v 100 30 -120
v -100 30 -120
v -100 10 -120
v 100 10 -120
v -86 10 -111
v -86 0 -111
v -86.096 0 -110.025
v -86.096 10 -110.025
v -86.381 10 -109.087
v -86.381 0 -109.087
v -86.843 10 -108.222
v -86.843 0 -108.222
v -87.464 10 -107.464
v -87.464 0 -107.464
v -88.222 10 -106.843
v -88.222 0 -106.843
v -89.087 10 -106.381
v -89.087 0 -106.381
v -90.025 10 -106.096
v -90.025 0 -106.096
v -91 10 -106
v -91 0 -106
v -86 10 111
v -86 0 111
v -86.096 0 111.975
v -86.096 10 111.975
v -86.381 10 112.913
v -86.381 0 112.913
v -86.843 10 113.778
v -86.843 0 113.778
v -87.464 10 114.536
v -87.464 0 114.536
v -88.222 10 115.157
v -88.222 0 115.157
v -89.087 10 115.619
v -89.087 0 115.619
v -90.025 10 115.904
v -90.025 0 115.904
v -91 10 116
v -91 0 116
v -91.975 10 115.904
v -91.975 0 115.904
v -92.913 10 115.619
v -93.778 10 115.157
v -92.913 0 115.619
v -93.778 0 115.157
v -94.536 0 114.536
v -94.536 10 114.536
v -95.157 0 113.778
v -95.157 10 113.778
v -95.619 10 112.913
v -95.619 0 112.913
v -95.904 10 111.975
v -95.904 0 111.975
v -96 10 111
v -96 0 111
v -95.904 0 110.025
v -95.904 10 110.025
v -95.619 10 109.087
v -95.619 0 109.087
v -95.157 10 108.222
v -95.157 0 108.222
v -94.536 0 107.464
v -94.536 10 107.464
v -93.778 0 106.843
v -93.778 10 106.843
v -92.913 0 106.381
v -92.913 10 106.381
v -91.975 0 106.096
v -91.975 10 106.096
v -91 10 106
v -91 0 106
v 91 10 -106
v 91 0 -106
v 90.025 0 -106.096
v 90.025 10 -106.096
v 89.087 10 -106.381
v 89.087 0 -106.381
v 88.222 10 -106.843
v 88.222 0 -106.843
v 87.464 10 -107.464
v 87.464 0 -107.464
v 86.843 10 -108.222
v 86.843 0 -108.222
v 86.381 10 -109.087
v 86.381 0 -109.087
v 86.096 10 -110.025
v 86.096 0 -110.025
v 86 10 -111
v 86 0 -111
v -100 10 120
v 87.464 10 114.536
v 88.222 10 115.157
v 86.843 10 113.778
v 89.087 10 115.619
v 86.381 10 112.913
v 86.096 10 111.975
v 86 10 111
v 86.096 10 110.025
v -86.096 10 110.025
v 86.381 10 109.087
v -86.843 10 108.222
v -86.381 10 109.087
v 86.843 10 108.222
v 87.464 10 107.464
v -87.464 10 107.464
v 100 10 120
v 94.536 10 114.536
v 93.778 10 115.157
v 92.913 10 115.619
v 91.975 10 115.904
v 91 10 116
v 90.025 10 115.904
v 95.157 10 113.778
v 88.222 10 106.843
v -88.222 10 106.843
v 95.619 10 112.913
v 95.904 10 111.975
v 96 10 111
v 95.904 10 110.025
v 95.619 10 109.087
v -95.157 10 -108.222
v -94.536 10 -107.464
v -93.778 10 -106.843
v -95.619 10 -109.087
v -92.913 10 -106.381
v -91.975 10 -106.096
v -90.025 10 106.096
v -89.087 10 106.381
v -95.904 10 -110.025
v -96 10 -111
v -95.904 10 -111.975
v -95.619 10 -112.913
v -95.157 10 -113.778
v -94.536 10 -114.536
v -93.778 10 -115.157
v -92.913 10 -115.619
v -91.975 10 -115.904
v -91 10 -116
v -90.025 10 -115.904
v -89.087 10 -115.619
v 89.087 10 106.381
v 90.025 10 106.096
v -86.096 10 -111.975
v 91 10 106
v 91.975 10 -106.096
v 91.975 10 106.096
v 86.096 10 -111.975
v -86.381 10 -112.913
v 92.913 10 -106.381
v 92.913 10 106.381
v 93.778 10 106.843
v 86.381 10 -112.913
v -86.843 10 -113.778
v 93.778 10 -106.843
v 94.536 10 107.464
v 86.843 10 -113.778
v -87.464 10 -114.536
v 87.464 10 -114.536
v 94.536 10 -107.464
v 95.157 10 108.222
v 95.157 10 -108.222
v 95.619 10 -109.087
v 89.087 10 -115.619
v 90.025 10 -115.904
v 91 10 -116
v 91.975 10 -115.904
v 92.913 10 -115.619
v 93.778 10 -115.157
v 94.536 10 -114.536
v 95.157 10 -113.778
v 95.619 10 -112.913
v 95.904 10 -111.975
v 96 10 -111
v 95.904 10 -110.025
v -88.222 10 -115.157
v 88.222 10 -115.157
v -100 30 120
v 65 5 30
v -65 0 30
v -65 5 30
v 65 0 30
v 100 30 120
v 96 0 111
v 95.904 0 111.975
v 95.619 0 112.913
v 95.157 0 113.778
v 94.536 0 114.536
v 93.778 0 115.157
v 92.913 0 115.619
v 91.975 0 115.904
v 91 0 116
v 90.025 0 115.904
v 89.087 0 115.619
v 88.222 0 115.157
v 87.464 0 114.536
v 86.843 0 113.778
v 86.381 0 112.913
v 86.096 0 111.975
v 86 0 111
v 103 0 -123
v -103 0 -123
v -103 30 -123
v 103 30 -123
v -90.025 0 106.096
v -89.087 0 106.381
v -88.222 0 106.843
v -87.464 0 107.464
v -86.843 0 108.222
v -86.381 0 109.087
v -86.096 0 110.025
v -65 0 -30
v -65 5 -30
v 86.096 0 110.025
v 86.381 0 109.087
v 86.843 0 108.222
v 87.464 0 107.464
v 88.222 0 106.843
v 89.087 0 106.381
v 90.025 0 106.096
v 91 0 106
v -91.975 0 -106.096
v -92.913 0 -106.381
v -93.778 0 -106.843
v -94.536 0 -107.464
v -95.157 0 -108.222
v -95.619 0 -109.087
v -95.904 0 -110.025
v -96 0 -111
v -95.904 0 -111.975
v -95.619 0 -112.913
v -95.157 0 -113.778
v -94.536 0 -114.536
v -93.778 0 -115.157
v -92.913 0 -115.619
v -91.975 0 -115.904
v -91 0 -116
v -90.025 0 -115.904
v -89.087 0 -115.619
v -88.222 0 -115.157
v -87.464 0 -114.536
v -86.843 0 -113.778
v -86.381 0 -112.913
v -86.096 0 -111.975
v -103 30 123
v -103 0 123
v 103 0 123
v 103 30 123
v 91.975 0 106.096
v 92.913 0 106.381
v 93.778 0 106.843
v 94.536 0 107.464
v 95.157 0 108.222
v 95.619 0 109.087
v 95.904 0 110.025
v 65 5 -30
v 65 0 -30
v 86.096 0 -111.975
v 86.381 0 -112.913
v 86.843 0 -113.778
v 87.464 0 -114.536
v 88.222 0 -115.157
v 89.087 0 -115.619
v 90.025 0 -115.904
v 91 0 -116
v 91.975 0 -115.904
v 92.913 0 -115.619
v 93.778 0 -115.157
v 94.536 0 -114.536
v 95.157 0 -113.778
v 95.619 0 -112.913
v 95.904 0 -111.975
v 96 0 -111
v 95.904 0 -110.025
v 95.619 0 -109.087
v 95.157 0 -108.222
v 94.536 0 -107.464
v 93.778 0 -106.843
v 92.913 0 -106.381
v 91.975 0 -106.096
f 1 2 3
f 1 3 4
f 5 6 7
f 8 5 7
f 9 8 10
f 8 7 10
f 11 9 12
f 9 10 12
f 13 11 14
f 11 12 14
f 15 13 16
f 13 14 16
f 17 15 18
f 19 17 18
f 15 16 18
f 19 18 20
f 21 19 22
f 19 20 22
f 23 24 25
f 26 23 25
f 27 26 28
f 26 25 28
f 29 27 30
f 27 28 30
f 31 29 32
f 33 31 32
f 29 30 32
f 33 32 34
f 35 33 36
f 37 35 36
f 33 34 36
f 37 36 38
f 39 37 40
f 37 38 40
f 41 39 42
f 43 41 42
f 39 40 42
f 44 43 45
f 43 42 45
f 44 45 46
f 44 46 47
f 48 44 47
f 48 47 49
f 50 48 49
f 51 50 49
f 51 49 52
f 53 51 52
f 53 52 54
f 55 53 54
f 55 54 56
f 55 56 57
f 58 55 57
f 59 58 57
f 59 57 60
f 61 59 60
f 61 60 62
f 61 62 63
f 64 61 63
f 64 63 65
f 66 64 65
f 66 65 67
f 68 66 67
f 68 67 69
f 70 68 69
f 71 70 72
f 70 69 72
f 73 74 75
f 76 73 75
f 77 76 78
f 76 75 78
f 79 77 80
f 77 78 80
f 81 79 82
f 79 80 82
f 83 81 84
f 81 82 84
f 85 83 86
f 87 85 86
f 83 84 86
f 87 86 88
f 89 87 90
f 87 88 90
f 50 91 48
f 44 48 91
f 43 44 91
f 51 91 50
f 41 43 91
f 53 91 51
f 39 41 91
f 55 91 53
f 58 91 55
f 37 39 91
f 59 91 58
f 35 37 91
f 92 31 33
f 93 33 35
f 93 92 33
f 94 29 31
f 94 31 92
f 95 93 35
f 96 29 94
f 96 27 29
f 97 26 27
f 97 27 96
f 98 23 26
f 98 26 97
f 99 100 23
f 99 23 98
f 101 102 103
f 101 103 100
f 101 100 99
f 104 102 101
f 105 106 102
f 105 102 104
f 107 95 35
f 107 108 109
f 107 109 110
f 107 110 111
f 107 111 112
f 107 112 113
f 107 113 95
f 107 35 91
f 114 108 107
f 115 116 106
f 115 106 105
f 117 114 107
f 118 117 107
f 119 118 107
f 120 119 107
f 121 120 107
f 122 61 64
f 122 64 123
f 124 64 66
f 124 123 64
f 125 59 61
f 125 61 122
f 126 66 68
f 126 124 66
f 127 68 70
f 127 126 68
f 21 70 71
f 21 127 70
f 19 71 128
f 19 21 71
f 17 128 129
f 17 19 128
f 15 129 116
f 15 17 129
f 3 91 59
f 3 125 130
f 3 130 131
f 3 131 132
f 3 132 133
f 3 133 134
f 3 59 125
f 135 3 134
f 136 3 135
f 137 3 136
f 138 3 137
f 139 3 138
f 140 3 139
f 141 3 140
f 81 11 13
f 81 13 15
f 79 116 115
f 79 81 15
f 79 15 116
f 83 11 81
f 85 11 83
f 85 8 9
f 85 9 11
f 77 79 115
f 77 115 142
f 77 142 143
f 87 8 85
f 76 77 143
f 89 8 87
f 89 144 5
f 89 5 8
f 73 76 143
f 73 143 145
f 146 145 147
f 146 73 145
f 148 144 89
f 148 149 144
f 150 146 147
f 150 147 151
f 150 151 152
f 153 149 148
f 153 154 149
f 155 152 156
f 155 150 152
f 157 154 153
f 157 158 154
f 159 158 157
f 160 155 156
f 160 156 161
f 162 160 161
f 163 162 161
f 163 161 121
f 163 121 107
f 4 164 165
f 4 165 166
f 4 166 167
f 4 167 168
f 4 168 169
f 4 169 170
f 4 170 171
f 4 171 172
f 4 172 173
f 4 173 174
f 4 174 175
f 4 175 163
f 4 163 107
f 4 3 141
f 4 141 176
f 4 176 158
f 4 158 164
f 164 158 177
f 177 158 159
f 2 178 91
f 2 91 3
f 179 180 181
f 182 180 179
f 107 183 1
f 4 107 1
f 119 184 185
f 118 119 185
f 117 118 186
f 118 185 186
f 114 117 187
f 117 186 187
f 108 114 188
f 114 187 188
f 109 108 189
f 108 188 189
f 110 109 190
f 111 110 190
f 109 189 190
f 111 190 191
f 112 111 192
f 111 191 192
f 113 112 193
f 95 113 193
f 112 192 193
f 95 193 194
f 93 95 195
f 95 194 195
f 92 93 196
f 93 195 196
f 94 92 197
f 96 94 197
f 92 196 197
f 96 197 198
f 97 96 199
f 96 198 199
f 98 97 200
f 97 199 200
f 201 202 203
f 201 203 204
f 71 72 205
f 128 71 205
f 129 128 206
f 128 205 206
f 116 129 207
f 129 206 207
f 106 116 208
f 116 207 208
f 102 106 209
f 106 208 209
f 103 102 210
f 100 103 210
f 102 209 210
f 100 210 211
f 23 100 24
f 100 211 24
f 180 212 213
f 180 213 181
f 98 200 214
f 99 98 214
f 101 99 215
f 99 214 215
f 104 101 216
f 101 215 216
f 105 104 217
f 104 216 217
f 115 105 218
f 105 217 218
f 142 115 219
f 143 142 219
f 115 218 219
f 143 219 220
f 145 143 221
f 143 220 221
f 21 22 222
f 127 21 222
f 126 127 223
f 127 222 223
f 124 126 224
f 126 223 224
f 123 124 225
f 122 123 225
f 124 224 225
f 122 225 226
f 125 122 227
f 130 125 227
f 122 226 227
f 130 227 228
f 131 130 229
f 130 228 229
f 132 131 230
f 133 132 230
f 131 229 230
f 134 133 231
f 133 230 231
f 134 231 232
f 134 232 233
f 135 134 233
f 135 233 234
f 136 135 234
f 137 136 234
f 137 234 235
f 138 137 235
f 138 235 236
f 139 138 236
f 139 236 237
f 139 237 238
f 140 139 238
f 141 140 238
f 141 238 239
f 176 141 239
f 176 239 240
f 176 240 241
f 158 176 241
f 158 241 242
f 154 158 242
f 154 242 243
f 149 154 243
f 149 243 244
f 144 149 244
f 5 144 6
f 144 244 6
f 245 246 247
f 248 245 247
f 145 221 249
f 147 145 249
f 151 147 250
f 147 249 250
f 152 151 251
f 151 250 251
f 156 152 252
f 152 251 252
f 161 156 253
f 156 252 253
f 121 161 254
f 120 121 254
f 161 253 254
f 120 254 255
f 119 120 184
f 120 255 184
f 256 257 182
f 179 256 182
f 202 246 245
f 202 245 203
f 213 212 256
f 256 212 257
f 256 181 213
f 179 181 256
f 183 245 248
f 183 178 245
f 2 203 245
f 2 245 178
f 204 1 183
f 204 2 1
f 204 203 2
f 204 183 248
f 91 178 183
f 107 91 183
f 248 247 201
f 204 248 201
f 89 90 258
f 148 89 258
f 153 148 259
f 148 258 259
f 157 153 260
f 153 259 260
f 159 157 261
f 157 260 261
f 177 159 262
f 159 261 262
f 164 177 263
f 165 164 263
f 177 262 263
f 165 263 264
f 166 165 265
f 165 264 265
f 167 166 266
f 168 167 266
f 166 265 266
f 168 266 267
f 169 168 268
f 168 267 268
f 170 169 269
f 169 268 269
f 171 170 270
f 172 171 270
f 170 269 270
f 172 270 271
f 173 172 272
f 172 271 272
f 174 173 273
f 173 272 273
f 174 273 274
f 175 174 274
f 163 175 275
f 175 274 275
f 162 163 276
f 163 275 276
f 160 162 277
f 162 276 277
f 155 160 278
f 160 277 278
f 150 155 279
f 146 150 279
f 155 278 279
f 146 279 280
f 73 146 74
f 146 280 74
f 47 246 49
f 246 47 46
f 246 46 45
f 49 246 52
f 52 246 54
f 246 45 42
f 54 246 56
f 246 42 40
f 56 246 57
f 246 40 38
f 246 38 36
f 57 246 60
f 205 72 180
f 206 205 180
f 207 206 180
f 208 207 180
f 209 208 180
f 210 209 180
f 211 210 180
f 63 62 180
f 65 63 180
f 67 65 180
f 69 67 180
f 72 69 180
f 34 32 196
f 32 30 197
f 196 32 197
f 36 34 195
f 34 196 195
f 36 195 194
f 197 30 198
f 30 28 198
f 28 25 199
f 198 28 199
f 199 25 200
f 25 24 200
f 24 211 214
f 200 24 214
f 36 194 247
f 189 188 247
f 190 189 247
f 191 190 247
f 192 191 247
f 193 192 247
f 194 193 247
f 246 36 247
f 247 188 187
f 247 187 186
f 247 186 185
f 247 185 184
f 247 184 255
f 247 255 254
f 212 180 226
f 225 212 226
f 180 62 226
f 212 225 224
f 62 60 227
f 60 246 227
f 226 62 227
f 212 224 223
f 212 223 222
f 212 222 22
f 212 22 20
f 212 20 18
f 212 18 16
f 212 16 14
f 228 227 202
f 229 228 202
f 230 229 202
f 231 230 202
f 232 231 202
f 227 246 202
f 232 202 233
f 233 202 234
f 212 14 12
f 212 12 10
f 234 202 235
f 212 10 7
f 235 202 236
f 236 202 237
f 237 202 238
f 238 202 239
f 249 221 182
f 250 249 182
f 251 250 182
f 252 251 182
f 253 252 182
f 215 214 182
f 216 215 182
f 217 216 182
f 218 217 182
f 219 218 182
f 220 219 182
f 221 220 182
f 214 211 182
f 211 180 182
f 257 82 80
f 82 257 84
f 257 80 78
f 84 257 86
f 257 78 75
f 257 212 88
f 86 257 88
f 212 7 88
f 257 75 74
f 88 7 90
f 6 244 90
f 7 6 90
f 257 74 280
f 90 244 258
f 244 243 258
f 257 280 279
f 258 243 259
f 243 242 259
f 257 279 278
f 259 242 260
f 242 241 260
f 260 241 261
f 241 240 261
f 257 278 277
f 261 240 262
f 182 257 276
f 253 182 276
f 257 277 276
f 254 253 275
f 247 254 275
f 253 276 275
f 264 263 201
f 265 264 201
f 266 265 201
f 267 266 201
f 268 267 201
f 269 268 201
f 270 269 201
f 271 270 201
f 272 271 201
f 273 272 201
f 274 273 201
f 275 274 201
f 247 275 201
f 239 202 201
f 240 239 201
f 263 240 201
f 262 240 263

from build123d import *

# Parameters (mm, degrees)
SKETCH1_W           = 206
SKETCH1_H           = 246
BOSS_EXTRUDE1_DEPTH = 60
SKETCH2_W           = 200
SKETCH2_H           = 240
CUT_EXTRUDE1_DEPTH  = 50
CUT_EXTRUDE3_DEPTH  = 172.283390905
SKETCH5_W           = 206
SKETCH5_H           = 246
CUT_EXTRUDE4_DEPTH  = 30
SKETCH6_W           = 130
SKETCH6_H           = 60
CUT_EXTRUDE5_DEPTH  = 5


with BuildPart() as part:
    # Sketch1 → Boss-Extrude1 (new body)
    with BuildSketch(Plane(origin=(0, 0, 0), x_dir=(1, 0, 0), z_dir=(0, 1, 0))):
        Rectangle(SKETCH1_W, SKETCH1_H)
    extrude(amount=BOSS_EXTRUDE1_DEPTH)

    # Sketch2 → Cut-Extrude1 (cut)
    with BuildSketch(Plane(origin=(0, 60, 0), x_dir=(1, 0, 0), z_dir=(0, 1, 0))):
        Rectangle(SKETCH2_W, SKETCH2_H)
    extrude(amount=-CUT_EXTRUDE1_DEPTH, mode=Mode.SUBTRACT)

    # Sketch3 → Cut-Extrude3 (cut, through all)
    with BuildSketch(Plane.XZ):
        with BuildLine():
            Line((-91, 106), (-91, 111))
            Line((-91, 111), (-86, 111))
            ThreePointArc((-86, 111), (-94.535533906, 114.535533906), (-91, 106))
        make_face()
        with BuildLine():
            Line((-86, 111), (-91, 111))
            Line((-91, 111), (-91, 106))
            ThreePointArc((-91, 106), (-87.464466094, 107.464466094), (-86, 111))
        make_face()
        with BuildLine():
            ThreePointArc((96, 111), (91, 116), (86, 111))
            Line((86, 111), (91, 111))
            Line((91, 111), (91, 106))
            ThreePointArc((91, 106), (94.535533906, 107.464466094), (96, 111))
        make_face()
        with BuildLine():
            Line((91, 111), (86, 111))
            ThreePointArc((86, 111), (87.464466094, 107.464466094), (91, 106))
            Line((91, 106), (91, 111))
        make_face()
        with BuildLine():
            ThreePointArc((96, -111), (94.535533906, -107.464466094), (91, -106))
            Line((91, -106), (91, -111))
            Line((91, -111), (86, -111))
            ThreePointArc((86, -111), (91, -116), (96, -111))
        make_face()
        with BuildLine():
            Line((91, -111), (91, -106))
            ThreePointArc((91, -106), (87.464466094, -107.464466094), (86, -111))
            Line((86, -111), (91, -111))
        make_face()
        with BuildLine():
            ThreePointArc((-86, -111), (-87.464466094, -107.464466094), (-91, -106))
            Line((-91, -106), (-91, -111))
            Line((-91, -111), (-86, -111))
        make_face()
        with BuildLine():
            Line((-91, -111), (-91, -106))
            ThreePointArc((-91, -106), (-94.535533906, -114.535533906), (-86, -111))
            Line((-86, -111), (-91, -111))
        make_face()
    extrude(amount=-CUT_EXTRUDE3_DEPTH, mode=Mode.SUBTRACT)

    # Sketch5 → Cut-Extrude4 (cut)
    with BuildSketch(Plane(origin=(0, 60, 0), x_dir=(1, 0, 0), z_dir=(0, 1, 0))):
        Rectangle(SKETCH5_W, SKETCH5_H)
    extrude(amount=-CUT_EXTRUDE4_DEPTH, mode=Mode.SUBTRACT)

    # Sketch6 → Cut-Extrude5 (cut)
    with BuildSketch(Plane.XZ):
        Rectangle(SKETCH6_W, SKETCH6_H)
    extrude(amount=-CUT_EXTRUDE5_DEPTH, mode=Mode.SUBTRACT)


solid = part.part
